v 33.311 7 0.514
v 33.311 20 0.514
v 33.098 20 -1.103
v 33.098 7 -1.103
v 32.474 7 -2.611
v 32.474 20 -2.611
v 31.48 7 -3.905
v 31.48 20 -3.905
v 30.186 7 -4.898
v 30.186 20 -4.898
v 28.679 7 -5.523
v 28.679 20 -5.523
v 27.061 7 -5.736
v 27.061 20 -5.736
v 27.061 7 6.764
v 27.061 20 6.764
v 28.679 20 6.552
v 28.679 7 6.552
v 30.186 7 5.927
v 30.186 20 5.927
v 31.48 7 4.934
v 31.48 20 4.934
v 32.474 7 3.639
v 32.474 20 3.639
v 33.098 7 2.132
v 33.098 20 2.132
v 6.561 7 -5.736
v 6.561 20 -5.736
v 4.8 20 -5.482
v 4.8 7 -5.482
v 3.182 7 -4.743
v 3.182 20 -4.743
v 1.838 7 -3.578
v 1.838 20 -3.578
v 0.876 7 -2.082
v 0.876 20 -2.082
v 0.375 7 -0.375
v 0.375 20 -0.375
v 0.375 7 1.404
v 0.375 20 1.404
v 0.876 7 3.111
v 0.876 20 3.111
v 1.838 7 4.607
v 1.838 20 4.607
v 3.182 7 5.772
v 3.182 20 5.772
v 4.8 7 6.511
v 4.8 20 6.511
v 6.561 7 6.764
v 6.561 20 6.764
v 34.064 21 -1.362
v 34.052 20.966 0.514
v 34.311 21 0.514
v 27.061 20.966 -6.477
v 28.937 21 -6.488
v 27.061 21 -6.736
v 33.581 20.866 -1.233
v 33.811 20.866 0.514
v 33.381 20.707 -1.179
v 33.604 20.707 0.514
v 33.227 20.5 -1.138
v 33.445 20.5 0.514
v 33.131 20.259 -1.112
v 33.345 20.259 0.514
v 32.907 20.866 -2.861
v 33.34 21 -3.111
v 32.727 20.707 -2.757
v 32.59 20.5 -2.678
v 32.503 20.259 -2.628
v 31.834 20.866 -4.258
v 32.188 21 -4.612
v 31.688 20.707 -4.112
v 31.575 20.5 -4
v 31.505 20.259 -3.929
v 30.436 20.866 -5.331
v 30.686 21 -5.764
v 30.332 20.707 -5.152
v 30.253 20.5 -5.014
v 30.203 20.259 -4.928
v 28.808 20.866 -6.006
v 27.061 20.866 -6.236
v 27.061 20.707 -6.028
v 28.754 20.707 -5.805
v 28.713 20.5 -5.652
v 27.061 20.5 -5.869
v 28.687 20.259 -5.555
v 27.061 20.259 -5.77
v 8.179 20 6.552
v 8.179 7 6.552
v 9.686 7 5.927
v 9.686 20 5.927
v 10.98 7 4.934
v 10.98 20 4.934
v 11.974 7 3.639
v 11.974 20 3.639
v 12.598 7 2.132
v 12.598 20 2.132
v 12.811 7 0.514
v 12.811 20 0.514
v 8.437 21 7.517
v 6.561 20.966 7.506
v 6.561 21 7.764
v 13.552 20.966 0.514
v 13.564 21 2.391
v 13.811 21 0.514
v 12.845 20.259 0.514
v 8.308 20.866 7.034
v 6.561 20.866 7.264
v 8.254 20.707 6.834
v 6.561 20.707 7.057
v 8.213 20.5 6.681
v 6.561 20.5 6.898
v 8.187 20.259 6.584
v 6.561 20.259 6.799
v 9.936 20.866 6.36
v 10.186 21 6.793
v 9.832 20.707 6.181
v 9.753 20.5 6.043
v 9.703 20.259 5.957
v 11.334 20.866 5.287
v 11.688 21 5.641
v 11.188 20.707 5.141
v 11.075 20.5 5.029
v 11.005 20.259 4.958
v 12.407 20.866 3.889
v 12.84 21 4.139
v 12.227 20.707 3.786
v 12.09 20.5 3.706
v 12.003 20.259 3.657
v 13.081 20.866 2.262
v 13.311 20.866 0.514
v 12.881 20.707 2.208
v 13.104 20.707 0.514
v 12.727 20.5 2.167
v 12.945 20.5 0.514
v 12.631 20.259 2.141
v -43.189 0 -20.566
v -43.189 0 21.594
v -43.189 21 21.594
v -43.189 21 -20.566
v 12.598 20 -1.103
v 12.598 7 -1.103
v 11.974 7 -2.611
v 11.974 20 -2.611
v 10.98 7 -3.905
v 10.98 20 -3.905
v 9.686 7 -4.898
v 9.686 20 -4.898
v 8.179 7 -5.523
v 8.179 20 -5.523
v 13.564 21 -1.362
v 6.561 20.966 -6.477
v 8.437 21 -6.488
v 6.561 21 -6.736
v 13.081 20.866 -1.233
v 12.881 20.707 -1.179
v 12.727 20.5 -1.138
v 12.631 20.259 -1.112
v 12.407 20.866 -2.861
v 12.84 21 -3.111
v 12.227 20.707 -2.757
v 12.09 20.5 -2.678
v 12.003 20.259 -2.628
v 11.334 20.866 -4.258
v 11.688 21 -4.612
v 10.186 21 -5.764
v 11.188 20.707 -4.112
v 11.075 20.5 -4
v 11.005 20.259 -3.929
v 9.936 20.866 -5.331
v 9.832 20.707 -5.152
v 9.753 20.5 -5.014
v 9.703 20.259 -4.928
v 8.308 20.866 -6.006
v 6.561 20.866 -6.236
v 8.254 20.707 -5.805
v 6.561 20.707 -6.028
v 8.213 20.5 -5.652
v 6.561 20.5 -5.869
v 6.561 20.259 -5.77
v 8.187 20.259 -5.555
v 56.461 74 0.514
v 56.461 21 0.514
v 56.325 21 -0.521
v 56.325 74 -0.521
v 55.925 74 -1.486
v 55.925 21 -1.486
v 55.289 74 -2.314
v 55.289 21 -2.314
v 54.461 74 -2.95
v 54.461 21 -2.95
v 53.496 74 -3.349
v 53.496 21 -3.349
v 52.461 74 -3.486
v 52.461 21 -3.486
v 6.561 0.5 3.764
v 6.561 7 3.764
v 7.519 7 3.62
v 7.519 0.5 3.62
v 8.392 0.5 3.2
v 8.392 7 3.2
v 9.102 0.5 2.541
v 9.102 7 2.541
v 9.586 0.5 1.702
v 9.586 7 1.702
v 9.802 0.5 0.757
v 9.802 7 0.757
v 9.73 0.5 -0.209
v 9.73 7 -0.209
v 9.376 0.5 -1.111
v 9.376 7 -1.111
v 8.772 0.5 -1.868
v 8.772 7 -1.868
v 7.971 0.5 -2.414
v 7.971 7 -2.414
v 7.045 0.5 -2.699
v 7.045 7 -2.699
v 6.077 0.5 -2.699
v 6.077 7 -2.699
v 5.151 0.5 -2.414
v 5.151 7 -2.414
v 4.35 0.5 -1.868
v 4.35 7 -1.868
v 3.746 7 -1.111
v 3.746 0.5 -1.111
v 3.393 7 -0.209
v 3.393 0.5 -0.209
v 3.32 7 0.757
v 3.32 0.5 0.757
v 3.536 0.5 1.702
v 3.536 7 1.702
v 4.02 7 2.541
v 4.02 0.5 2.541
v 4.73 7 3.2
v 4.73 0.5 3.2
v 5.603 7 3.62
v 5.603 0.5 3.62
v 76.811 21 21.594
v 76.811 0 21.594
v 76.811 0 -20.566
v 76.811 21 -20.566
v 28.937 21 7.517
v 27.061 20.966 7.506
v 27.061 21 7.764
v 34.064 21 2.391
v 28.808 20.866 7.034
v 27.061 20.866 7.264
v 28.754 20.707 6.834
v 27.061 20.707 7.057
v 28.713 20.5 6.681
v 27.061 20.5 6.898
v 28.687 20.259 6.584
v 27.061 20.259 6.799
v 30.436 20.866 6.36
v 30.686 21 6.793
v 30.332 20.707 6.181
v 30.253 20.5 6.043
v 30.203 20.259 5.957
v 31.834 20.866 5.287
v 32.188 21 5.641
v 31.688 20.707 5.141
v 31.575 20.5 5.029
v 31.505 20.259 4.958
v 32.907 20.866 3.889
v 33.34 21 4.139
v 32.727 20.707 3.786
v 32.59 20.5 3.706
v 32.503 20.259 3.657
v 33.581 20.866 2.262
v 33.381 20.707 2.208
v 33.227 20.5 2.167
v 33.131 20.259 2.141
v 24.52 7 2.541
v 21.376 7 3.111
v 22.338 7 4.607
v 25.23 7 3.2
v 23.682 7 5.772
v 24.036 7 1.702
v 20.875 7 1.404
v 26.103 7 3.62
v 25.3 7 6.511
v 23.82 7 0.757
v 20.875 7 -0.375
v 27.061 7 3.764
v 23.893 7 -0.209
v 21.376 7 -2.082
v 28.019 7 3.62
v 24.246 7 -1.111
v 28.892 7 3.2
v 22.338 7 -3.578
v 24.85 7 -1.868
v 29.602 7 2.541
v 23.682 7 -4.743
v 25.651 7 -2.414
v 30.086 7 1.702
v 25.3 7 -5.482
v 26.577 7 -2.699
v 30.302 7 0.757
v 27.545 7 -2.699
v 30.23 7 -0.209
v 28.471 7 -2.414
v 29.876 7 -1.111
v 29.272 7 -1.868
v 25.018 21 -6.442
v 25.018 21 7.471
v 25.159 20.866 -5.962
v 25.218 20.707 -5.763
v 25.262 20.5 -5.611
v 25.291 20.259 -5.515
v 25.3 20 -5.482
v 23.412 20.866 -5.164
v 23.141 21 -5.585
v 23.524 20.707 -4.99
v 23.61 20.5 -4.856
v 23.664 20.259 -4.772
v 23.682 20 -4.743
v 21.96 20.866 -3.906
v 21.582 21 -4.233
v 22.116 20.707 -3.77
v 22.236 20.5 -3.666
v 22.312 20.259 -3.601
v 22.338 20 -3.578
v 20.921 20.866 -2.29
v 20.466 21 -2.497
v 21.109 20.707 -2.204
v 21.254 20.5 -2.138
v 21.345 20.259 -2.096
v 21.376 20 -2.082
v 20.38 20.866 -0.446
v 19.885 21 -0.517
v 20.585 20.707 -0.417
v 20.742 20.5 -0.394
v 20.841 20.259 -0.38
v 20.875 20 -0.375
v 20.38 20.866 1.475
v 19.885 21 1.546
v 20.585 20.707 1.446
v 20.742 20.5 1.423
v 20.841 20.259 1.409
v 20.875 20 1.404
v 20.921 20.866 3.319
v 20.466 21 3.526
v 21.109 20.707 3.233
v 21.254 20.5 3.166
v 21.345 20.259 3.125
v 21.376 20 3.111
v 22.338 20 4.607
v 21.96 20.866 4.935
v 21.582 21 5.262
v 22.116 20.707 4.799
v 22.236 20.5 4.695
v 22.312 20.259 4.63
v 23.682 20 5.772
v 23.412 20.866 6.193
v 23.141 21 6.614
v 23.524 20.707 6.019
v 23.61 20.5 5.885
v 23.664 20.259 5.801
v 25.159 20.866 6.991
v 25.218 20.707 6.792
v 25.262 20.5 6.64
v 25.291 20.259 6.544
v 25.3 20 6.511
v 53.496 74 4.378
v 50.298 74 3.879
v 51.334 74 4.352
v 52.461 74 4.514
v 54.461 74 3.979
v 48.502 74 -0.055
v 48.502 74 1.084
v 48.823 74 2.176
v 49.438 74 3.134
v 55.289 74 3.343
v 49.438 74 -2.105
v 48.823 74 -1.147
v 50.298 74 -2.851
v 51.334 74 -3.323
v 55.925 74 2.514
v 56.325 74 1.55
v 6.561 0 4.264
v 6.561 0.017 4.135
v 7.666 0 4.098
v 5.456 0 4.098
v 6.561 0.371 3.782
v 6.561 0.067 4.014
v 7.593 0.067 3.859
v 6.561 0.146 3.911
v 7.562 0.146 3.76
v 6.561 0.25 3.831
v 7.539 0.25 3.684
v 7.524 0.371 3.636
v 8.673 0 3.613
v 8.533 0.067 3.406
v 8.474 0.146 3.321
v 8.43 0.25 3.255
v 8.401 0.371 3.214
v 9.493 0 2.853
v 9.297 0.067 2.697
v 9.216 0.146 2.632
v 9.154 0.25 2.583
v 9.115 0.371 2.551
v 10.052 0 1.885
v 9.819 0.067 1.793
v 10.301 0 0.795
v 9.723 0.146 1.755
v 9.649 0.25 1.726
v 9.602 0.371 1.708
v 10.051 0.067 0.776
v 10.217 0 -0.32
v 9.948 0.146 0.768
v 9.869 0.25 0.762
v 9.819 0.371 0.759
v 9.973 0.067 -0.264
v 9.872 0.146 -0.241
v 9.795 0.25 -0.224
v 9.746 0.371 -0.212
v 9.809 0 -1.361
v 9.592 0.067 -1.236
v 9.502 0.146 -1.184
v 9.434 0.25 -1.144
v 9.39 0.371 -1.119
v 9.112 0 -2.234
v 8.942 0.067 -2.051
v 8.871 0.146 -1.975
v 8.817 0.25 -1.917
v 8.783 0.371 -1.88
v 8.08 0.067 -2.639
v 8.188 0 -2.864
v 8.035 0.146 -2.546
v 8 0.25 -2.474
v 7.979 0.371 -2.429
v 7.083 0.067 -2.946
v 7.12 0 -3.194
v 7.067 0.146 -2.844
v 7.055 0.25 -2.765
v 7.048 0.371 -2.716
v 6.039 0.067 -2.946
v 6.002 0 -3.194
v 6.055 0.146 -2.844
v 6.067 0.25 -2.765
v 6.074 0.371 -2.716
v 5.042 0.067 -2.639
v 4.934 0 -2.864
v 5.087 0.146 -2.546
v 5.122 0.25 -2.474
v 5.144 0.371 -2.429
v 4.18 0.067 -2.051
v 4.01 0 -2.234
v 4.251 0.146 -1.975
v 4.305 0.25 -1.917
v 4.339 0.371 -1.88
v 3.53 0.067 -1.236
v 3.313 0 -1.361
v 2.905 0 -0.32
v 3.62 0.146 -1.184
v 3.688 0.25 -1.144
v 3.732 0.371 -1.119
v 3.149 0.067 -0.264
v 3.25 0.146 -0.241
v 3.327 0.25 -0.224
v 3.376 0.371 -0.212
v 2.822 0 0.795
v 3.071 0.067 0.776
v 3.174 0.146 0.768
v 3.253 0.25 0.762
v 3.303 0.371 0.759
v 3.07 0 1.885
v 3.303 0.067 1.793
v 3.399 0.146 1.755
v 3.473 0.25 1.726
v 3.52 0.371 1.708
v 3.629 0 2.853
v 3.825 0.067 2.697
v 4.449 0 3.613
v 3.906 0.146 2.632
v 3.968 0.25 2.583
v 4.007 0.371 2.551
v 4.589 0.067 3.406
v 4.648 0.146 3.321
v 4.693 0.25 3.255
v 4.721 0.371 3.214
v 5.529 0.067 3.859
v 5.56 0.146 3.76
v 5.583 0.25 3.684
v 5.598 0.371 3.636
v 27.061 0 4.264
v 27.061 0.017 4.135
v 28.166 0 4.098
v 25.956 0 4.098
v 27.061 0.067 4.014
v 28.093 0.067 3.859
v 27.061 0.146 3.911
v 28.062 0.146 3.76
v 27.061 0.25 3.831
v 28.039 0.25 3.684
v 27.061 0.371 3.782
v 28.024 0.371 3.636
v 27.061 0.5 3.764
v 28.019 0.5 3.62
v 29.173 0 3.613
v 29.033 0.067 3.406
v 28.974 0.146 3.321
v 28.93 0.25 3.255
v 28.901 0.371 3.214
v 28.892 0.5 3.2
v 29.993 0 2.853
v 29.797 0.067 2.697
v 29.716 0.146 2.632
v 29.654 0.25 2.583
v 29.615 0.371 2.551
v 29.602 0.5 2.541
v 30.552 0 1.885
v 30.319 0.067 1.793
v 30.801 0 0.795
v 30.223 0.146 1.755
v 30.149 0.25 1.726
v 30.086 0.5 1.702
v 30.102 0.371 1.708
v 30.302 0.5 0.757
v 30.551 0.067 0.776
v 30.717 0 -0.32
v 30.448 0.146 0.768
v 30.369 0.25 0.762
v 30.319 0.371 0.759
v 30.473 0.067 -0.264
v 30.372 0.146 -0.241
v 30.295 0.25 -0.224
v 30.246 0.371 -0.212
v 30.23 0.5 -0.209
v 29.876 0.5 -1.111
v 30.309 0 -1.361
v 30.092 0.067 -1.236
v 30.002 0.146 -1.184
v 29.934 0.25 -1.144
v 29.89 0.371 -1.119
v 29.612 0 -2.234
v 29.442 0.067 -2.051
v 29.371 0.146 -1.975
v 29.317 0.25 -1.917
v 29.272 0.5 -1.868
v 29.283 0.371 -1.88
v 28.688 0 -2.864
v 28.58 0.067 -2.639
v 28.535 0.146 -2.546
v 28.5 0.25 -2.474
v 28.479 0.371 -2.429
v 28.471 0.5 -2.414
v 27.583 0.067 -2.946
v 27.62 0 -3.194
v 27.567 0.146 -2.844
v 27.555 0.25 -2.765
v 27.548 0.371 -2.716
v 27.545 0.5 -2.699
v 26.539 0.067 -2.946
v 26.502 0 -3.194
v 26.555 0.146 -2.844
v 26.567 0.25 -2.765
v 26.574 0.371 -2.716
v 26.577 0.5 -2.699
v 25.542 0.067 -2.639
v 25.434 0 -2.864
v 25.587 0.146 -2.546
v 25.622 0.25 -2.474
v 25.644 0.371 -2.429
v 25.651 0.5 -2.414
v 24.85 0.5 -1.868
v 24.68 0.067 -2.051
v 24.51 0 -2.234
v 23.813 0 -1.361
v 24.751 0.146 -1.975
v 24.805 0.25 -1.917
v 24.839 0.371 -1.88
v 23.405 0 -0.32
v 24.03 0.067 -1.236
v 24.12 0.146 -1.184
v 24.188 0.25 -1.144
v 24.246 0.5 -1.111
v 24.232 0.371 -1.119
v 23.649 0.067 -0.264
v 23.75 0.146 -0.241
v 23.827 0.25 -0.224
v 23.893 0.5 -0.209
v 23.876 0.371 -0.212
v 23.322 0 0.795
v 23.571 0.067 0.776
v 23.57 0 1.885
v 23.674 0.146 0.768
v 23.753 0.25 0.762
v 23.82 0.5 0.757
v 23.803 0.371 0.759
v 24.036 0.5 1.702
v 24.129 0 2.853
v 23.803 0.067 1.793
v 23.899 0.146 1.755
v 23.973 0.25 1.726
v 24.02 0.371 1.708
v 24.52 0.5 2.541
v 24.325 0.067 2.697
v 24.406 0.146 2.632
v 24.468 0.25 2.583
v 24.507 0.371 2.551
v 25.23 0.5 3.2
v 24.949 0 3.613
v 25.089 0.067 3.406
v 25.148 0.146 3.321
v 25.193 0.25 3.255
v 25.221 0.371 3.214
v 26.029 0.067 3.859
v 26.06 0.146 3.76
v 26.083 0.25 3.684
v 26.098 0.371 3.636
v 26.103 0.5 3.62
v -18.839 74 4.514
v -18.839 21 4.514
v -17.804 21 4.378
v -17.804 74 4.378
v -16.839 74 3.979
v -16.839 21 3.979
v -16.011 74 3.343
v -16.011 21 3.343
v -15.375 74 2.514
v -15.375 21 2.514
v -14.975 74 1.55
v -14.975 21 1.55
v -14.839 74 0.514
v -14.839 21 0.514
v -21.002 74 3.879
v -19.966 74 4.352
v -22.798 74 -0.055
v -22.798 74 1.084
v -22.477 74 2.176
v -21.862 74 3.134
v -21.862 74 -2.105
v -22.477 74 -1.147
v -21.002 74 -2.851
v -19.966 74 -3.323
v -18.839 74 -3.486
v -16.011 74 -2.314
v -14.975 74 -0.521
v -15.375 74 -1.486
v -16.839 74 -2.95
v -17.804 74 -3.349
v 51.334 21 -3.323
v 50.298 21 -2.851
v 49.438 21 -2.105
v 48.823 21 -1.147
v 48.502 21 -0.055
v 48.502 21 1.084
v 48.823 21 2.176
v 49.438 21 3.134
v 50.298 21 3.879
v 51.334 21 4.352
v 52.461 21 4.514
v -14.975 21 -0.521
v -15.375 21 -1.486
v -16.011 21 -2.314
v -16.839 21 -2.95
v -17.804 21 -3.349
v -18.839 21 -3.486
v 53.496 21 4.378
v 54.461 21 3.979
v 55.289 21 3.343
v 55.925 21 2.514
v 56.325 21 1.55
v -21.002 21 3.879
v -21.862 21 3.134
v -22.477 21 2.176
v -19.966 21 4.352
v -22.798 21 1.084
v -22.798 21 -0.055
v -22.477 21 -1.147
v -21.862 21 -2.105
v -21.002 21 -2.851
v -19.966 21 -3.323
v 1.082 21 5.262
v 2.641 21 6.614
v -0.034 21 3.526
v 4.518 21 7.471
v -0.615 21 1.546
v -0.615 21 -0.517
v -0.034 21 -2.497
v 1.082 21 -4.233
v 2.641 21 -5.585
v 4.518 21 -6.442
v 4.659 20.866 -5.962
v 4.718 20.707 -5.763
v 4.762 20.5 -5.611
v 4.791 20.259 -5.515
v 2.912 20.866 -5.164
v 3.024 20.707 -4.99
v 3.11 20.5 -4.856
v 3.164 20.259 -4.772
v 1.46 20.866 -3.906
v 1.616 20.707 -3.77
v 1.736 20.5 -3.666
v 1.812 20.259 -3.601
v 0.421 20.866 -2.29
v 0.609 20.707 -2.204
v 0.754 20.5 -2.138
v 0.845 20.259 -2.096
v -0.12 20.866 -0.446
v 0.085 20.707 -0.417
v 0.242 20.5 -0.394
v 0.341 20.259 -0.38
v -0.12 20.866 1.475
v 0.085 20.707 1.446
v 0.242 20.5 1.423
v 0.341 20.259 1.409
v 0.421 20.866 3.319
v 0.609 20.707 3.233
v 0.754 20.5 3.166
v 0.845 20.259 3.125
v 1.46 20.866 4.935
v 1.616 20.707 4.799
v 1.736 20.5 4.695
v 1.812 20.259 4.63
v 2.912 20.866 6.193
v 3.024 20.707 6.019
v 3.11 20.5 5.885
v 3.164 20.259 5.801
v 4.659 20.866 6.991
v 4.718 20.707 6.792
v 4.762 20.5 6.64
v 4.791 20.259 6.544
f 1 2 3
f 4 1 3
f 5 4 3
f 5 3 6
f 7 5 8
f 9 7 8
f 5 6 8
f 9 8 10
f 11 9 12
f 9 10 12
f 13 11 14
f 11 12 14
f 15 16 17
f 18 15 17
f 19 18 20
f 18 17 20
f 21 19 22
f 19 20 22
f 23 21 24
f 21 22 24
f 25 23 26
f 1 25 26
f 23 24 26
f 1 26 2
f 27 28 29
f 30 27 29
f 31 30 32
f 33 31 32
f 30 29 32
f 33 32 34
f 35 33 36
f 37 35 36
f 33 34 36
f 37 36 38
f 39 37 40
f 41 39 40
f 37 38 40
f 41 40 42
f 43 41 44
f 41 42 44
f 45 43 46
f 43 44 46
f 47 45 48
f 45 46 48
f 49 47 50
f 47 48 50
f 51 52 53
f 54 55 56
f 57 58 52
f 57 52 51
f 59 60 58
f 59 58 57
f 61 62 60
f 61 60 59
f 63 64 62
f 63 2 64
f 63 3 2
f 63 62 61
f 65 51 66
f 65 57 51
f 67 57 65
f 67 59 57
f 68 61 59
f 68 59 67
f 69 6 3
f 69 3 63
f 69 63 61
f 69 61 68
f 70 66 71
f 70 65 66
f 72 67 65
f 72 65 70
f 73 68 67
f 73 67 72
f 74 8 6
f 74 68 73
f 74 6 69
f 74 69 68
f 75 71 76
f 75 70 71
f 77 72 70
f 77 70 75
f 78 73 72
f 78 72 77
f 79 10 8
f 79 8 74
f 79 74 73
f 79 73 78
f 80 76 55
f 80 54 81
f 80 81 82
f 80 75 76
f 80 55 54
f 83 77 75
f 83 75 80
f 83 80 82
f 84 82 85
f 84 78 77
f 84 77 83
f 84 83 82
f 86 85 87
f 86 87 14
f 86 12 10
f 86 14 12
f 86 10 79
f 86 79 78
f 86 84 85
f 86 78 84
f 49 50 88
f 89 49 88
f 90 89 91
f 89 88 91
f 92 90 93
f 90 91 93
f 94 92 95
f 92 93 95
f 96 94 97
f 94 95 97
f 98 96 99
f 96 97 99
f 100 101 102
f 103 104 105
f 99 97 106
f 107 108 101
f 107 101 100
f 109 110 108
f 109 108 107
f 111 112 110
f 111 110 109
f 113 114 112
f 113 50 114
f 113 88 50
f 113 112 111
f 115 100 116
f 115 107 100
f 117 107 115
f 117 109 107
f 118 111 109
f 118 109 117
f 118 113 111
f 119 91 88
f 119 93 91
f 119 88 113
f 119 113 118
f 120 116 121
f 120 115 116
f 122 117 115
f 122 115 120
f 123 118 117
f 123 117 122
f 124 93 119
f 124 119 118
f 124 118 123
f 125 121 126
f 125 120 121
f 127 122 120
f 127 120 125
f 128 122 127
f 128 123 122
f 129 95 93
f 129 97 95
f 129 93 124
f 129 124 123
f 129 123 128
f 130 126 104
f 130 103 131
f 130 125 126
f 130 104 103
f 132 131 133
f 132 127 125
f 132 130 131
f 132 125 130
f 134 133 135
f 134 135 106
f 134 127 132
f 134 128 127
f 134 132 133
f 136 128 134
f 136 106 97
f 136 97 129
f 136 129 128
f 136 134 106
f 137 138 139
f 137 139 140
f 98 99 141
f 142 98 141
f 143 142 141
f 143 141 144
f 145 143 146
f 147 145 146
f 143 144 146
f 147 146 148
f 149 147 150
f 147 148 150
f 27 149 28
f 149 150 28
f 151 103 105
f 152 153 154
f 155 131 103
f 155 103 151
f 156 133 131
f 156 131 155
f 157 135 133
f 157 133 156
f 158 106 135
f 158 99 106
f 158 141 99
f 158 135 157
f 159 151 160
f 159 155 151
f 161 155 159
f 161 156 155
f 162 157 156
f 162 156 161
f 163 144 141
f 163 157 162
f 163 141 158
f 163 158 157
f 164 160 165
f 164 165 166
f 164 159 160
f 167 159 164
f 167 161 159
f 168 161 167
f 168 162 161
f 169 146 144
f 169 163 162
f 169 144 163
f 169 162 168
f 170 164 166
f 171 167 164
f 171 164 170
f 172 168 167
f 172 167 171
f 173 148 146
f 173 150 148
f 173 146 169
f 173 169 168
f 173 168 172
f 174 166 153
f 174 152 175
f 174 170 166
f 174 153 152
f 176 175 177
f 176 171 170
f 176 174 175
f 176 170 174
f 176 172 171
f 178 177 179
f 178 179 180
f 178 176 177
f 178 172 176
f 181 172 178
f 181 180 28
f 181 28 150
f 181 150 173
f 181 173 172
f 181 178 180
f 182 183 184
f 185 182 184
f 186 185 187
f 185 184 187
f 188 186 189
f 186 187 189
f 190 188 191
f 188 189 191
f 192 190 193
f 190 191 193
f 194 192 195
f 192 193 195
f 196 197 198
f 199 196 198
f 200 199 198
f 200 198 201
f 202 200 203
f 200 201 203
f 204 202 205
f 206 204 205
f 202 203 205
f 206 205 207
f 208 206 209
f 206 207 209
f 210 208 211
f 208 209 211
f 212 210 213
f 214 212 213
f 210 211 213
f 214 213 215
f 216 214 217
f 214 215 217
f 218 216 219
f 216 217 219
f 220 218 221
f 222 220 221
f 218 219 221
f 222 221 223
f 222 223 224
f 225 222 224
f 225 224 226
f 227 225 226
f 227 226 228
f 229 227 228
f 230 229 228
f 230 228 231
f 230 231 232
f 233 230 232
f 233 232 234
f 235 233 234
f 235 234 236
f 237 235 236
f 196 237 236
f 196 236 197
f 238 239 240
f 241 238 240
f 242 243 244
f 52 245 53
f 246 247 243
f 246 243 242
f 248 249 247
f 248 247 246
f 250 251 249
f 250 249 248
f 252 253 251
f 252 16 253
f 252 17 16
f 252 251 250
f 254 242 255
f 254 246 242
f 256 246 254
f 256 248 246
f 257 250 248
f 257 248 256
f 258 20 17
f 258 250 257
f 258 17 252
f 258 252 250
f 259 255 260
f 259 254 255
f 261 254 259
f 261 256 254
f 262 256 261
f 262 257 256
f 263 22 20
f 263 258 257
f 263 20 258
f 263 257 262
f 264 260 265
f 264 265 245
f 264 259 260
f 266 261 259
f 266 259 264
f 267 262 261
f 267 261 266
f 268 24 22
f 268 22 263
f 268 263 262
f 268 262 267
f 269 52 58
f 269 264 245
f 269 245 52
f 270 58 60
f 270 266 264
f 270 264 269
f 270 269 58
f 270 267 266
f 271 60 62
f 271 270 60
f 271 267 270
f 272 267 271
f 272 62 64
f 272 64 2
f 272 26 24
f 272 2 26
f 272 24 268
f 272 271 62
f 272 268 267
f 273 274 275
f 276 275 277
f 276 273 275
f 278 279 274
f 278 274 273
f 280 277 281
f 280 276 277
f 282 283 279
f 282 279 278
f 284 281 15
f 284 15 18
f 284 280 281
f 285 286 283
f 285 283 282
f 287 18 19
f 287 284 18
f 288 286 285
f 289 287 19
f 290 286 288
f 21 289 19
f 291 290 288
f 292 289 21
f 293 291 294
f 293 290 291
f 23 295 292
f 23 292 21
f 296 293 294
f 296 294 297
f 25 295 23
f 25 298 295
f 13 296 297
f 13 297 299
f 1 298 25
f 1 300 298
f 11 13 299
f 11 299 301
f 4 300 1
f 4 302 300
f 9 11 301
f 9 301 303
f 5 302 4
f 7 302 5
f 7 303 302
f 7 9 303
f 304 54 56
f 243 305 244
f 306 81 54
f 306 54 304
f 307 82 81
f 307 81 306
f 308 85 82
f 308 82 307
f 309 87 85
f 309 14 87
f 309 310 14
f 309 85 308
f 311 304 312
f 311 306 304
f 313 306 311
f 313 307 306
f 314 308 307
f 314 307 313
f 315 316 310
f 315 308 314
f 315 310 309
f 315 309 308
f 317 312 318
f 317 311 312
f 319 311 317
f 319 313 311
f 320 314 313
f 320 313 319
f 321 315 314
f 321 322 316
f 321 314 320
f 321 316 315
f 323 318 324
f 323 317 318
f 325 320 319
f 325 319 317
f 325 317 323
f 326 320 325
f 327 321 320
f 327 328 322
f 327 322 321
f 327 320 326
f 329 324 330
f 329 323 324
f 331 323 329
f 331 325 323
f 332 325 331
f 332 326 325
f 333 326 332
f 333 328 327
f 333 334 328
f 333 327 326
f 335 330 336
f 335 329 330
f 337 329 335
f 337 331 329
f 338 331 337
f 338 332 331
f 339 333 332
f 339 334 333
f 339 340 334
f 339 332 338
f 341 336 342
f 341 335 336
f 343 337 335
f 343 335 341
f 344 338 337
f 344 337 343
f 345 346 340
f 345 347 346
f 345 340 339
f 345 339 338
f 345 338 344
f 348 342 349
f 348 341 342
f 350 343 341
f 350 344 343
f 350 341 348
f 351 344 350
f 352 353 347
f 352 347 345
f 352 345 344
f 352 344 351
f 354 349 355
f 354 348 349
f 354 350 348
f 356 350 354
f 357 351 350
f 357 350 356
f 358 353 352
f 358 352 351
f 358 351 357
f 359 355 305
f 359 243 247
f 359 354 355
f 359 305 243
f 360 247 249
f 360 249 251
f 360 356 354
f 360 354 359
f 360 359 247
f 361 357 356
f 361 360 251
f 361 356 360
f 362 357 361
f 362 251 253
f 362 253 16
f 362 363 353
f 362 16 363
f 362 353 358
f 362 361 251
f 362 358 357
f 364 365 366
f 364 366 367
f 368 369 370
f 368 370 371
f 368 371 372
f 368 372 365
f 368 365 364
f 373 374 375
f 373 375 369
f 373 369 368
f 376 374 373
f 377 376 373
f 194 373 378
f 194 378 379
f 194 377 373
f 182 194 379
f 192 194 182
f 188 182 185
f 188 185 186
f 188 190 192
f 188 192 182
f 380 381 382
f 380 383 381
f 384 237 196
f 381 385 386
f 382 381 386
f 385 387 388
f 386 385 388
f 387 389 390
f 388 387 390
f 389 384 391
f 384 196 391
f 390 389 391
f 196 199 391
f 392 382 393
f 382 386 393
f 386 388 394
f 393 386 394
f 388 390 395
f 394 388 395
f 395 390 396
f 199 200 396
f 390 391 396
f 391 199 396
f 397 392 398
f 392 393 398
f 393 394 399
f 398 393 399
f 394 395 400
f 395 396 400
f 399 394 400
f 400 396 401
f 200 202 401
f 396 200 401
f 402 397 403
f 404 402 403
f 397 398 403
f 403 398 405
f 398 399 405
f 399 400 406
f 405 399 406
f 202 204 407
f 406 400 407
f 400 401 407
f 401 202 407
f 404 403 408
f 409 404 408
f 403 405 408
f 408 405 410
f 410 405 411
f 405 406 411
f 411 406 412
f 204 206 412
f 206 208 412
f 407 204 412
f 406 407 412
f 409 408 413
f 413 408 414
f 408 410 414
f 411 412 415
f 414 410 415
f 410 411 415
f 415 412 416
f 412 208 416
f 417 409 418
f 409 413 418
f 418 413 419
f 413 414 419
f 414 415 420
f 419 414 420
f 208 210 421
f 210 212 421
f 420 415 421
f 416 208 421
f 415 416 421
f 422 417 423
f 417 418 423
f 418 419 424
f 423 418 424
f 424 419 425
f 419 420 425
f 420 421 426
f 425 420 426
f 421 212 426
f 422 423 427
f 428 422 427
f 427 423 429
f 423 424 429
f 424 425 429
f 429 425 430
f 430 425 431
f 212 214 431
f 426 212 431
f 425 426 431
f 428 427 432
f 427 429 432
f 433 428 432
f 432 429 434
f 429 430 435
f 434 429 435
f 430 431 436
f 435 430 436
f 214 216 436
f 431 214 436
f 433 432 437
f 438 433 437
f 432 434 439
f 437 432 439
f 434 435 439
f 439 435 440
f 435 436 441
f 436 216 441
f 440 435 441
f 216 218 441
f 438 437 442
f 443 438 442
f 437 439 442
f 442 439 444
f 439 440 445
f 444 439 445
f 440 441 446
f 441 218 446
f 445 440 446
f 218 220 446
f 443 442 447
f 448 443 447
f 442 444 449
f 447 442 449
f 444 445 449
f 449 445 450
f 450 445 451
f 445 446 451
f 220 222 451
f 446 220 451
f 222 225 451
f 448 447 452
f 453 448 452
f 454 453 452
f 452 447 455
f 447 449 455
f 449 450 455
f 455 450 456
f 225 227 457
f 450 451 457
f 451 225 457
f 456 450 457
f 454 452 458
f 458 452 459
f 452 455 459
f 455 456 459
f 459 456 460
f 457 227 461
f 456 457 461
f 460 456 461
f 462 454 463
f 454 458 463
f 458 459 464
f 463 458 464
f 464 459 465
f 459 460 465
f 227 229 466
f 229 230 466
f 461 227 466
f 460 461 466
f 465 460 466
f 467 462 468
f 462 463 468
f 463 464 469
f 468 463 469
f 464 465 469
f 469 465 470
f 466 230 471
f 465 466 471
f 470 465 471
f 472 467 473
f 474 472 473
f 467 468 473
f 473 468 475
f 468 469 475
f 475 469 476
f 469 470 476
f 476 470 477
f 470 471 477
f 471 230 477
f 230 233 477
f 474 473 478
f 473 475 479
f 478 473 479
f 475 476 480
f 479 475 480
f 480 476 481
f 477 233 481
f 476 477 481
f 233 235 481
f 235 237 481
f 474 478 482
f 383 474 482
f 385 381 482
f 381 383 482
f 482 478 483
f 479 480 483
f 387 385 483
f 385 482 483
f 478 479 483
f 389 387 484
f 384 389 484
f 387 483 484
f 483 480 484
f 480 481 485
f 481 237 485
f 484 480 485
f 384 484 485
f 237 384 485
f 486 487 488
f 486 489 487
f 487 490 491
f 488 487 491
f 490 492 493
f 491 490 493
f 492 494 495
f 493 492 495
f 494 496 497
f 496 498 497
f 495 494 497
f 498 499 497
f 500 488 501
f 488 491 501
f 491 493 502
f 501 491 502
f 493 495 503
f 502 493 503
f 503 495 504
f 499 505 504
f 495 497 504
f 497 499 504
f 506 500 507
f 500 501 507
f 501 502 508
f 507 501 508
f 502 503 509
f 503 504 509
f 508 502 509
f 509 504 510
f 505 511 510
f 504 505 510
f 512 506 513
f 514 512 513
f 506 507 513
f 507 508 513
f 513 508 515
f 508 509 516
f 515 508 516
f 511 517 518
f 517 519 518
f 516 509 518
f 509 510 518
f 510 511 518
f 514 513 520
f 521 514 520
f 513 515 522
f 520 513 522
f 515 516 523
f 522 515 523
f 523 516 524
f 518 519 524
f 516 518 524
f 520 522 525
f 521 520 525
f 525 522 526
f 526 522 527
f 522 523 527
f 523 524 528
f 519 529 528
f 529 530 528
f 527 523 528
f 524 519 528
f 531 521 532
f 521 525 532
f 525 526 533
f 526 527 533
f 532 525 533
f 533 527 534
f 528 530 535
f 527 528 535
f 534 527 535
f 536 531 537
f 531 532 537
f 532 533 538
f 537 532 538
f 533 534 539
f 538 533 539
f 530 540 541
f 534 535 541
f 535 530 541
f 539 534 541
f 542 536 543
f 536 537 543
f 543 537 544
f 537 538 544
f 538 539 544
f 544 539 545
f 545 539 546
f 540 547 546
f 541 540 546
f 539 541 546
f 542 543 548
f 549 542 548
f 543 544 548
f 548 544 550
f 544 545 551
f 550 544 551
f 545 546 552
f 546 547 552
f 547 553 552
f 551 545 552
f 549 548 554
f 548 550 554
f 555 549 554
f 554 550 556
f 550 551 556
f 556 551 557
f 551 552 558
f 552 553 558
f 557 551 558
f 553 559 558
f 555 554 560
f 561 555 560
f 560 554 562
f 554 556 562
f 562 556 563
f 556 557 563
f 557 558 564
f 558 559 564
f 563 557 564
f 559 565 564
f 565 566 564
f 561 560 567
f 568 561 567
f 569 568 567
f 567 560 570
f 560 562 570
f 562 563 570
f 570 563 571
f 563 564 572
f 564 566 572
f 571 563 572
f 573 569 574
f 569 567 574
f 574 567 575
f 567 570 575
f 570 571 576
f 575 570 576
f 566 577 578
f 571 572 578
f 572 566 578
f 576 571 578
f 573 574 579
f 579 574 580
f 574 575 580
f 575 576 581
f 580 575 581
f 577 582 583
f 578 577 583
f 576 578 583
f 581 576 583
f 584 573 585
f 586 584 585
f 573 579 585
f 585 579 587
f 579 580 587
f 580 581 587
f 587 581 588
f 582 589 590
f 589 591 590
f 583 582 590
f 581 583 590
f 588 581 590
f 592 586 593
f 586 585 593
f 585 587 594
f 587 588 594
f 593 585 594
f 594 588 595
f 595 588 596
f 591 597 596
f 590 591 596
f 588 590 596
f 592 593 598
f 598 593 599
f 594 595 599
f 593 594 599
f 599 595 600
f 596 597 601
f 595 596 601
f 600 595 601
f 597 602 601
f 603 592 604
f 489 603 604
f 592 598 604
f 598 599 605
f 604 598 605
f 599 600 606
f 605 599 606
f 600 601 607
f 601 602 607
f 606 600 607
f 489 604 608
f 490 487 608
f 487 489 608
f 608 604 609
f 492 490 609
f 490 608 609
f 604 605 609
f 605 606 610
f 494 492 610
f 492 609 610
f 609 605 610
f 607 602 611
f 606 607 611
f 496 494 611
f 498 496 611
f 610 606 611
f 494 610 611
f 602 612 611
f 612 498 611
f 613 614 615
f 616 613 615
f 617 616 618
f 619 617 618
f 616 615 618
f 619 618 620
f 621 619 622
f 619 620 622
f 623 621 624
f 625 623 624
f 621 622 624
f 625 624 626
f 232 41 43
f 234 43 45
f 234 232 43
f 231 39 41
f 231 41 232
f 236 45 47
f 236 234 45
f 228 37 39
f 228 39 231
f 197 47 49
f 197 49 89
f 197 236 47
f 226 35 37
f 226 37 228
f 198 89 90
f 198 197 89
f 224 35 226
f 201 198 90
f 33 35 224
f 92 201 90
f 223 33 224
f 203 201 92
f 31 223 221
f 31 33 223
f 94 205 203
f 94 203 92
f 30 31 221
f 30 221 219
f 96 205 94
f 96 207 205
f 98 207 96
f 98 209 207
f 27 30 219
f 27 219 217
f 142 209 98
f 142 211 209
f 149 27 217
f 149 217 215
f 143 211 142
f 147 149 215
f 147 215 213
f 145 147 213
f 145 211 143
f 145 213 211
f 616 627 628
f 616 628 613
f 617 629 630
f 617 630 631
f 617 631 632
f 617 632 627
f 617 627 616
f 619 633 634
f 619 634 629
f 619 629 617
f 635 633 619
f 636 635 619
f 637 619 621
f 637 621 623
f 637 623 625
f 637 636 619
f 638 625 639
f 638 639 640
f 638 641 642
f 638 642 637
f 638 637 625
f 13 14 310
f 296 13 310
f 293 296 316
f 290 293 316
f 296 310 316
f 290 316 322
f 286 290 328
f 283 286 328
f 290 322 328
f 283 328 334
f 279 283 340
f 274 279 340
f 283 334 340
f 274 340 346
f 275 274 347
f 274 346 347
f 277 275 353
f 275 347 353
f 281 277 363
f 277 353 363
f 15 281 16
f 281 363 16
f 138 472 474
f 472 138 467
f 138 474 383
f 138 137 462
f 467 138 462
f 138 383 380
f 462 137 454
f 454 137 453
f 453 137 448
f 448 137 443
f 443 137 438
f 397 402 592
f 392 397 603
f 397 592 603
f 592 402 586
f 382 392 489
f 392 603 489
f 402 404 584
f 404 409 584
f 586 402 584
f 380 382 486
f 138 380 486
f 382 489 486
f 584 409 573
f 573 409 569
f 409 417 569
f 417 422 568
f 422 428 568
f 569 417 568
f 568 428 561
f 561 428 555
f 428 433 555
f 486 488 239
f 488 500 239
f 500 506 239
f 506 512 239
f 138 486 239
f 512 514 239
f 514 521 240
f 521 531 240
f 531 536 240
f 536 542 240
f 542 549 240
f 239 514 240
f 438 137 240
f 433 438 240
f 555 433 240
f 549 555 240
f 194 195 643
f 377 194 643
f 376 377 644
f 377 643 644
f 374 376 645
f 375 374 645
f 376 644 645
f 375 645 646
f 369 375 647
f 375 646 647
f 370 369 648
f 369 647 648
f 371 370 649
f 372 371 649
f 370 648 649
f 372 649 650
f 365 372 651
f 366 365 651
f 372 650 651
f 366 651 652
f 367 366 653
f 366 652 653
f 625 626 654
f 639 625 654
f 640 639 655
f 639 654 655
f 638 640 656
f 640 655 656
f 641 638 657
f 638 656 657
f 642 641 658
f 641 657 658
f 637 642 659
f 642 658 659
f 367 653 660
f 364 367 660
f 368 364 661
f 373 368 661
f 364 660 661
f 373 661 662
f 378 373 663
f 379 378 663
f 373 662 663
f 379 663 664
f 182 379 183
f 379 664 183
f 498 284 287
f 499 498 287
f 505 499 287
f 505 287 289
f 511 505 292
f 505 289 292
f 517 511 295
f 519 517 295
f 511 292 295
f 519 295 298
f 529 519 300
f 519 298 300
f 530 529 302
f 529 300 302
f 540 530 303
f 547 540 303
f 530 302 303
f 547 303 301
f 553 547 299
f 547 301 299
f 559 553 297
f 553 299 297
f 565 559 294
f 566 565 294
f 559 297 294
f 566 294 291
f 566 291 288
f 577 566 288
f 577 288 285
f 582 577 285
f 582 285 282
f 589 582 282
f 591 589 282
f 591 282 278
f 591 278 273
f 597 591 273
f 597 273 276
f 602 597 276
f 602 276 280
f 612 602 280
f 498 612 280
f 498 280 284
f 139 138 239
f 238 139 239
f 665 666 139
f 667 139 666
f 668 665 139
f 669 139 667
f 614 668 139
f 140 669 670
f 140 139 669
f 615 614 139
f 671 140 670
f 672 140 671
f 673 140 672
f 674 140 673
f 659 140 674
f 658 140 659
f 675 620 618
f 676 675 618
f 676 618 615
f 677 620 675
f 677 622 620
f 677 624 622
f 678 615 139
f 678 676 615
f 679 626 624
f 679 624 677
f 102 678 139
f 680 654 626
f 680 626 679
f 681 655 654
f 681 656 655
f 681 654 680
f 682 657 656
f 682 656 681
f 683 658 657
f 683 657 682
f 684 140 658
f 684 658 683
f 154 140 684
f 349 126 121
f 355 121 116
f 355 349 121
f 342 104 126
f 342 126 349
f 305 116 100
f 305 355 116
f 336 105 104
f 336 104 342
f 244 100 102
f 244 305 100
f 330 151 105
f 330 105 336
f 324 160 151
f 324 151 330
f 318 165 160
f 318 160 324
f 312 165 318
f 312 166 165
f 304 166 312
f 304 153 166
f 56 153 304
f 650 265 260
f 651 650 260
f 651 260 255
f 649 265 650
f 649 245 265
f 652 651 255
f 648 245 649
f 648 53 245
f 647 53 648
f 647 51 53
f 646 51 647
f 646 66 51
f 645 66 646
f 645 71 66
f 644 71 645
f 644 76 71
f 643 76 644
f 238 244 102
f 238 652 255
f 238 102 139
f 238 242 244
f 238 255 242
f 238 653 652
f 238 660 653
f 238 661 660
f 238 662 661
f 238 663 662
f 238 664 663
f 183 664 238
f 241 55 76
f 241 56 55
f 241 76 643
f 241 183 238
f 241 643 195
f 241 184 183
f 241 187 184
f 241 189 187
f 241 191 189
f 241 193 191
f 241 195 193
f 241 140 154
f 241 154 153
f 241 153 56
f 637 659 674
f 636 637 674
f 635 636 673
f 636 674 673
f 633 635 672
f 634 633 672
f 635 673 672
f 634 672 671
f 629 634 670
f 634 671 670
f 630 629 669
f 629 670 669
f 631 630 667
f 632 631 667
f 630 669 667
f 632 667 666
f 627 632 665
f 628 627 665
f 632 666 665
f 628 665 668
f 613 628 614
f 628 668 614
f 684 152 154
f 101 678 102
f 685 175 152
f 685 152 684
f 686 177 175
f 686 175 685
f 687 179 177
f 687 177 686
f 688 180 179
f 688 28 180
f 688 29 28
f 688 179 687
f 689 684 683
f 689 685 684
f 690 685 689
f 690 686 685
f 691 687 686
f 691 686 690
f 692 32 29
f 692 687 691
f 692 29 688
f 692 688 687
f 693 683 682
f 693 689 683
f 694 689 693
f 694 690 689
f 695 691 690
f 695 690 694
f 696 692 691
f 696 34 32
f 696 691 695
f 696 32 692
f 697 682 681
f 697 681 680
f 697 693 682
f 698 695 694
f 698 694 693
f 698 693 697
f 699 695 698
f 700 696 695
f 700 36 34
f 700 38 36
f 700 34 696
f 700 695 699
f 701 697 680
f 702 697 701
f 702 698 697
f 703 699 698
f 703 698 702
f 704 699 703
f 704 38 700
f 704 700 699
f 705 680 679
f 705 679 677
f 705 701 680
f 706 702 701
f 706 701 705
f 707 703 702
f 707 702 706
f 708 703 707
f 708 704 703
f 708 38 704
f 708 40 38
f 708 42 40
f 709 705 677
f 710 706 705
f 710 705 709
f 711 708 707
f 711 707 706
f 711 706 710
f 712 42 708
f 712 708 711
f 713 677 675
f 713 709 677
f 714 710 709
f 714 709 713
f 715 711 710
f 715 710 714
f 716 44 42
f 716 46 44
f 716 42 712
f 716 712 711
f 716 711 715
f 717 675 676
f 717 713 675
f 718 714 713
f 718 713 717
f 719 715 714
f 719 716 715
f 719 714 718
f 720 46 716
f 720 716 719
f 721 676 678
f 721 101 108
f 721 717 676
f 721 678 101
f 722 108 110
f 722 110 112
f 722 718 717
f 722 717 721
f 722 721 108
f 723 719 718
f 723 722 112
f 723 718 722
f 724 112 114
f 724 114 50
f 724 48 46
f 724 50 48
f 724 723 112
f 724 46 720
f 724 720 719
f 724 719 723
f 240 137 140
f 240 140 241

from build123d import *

# Parameters (mm, degrees)
SKETCH1_W           = 120
SKETCH1_H           = 42.16
BOSS_EXTRUDE1_DEPTH = 21
SKETCH2_R           = 6.25
CUT_EXTRUDE1_DEPTH  = 14
SKETCH3_R           = 3.25
CUT_EXTRUDE2_DEPTH  = 82.007752785
FILLET1_R           = 1
FILLET2_R           = 0.5
SKETCH4_R           = 4
BOSS_EXTRUDE2_DEPTH = 53


with BuildPart() as part:
    # Sketch1 → Boss-Extrude1 (new body)
    with BuildSketch(Plane(origin=(0, 0, 0), x_dir=(1, 0, 0), z_dir=(0, 1, 0))):
        with Locations((16.811029237, -0.514485382)):
            Rectangle(SKETCH1_W, SKETCH1_H)
    extrude(amount=BOSS_EXTRUDE1_DEPTH)

    # Sketch2 → Cut-Extrude1 (cut)
    with BuildSketch(Plane(origin=(0, 21, 0), x_dir=(1, 0, 0), z_dir=(0, 1, 0))):
        with Locations((27.061029237, -0.514485382)):
            Circle(SKETCH2_R)
        with Locations((6.561029237, -0.514485382)):
            Circle(SKETCH2_R)
    extrude(amount=-CUT_EXTRUDE1_DEPTH, mode=Mode.SUBTRACT)

    # Sketch3 → Cut-Extrude2 (cut, through all)
    with BuildSketch(Plane(origin=(0, 7, 0), x_dir=(1, 0, 0), z_dir=(0, 1, 0))):
        with Locations((27.061029237, -0.514485382)):
            Circle(SKETCH3_R)
        with Locations((6.561029237, -0.514485382)):
            Circle(SKETCH3_R)
    extrude(amount=-CUT_EXTRUDE2_DEPTH, mode=Mode.SUBTRACT)

    # Fillet1
    fillet1_edges = [part.edges().sort_by_distance(p)[0] for p in [
        (0.311029237, 21, 0.514485382),
        (20.811029237, 21, 0.514485382),
    ]]
    fillet(fillet1_edges, radius=FILLET1_R)

    # Fillet2
    fillet2_edges = [part.edges().sort_by_distance(p)[0] for p in [
        (3.311029237, 0, 0.514485382),
        (23.811029237, 0, 0.514485382),
    ]]
    fillet(fillet2_edges, radius=FILLET2_R)

    # Sketch4 → Boss-Extrude2 (add)
    with BuildSketch(Plane(origin=(0, 21, 0), x_dir=(1, 0, 0), z_dir=(0, 1, 0))):
        with Locations((52.461029237, -0.514485382)):
            Circle(SKETCH4_R)
        with Locations((-18.838970763, -0.514485382)):
            Circle(SKETCH4_R)
    extrude(amount=BOSS_EXTRUDE2_DEPTH)


solid = part.part
